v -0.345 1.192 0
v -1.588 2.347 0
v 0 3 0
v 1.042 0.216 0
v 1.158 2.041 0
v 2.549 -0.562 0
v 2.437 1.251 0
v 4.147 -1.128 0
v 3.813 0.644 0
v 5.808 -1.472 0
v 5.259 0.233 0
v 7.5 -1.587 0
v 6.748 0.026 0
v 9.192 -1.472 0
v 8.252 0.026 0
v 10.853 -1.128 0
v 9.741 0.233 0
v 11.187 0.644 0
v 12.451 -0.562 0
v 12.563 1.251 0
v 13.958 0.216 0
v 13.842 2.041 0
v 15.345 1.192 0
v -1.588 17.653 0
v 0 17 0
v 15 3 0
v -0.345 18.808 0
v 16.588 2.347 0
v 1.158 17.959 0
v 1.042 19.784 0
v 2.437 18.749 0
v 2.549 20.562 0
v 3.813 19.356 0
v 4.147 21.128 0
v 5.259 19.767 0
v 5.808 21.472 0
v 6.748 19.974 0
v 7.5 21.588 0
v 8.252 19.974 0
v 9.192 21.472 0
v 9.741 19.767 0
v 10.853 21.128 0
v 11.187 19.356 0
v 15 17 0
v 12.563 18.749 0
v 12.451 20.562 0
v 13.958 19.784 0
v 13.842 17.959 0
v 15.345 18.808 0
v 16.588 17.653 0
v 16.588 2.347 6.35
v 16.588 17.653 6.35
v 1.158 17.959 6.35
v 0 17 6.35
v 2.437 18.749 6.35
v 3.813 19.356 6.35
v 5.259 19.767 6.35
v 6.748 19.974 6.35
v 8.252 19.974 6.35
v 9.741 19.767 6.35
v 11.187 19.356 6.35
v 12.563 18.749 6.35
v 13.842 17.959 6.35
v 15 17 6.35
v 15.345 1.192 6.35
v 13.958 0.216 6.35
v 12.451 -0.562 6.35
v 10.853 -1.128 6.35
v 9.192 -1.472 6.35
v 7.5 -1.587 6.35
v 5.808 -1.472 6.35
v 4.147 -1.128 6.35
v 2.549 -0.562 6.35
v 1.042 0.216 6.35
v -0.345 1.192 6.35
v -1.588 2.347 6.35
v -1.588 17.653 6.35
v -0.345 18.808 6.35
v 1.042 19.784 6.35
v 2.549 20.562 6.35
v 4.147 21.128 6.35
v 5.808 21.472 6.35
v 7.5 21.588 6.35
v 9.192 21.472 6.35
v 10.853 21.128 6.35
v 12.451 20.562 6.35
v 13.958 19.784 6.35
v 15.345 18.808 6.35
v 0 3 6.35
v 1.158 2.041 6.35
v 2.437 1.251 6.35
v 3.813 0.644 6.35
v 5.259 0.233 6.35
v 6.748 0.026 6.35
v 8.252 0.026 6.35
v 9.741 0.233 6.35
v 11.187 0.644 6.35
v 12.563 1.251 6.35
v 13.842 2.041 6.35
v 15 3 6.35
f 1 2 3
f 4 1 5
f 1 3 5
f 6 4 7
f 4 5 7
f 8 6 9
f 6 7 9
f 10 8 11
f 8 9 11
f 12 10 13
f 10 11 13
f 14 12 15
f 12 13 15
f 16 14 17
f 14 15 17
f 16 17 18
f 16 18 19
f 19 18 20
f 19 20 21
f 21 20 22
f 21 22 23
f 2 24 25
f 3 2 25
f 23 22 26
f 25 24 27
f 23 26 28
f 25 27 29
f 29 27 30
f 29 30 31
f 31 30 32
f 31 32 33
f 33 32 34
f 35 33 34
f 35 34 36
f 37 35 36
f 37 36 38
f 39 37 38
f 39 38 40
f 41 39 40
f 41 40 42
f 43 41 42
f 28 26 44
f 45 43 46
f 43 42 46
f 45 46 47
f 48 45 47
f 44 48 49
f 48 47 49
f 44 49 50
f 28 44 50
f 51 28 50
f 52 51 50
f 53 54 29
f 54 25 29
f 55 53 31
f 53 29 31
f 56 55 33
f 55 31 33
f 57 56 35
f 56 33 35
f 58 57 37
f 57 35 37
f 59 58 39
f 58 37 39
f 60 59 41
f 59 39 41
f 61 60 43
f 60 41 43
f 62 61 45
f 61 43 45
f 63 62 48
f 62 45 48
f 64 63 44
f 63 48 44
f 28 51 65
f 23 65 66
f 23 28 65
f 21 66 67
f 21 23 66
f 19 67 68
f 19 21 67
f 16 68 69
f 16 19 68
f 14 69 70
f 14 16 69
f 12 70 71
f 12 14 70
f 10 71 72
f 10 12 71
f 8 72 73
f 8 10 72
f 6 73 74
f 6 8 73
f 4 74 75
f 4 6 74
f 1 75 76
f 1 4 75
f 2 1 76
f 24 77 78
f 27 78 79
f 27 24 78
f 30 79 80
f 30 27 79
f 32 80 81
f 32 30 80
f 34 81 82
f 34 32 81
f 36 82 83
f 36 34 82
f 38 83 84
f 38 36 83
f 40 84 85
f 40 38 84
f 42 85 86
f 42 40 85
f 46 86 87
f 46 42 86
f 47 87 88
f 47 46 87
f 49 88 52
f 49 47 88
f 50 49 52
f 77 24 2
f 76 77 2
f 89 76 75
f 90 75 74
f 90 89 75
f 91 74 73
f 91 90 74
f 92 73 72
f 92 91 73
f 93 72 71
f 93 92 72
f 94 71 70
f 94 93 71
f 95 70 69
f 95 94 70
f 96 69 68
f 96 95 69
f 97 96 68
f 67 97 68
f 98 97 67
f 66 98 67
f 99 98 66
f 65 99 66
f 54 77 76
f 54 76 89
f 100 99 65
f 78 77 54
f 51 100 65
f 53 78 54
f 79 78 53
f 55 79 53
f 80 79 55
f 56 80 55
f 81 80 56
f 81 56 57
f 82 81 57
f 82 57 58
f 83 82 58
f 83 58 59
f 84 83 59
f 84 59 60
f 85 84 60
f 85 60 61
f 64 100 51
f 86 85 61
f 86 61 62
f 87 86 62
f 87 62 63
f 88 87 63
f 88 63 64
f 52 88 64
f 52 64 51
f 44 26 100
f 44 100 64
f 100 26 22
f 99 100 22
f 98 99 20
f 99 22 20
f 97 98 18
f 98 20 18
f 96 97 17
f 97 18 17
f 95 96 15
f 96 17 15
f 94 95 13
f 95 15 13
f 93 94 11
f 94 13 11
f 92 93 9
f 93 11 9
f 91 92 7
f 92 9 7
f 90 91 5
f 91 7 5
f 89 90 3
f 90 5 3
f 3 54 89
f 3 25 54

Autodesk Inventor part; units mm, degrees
ref_plane "YZ Plane" through (0, 0, 0) normal (1, 0, 0) x (0, 1, 0)
ref_plane "XZ Plane" through (0, 0, 0) normal (0, 1, 0) x (-1, 0, 0)
ref_plane "XY Plane" through (0, 0, 0) normal (0, 0, 1) x (1, 0, 0)
sketch "Sketch1" plane through (0, 0, 0) normal (0, 0, 1) x (1, 0, 0)
  line L0 (0, 0) -> (15, 0)
  line L1 (15, 0) -> (15, 20)
  line L2 (15, 20) -> (0, 20)
  line L3 (0, 20) -> (0, 0)
  line L4 (0, 3) -> (15, 3)
  line L5 (15, 3) -> (15, 17)
  line L6 (15, 17) -> (0, 17)
  line L7 (0, 17) -> (0, 3)
  line L8 (0, 3) -> (15, 17) construction
  line L9 (15, 3) -> (0, 17) construction
  arc A0 (15, 17) -> (0, 17) centre (7.5, 9.125) ccw
  arc A1 (0, 3) -> (15, 3) centre (7.5, 10.875) ccw
  line L10 (-1.5875, -1.5875) -> (16.5875, -1.5875)
  line L11 (16.5875, -1.5875) -> (16.5875, 21.5875)
  line L12 (16.5875, 21.5875) -> (-1.5875, 21.5875)
  line L13 (-1.5875, 21.5875) -> (-1.5875, -1.5875)
  arc A2 (18.2337, 15.4576) -> (-3.6211, 14.7494) centre (7.5, 9.125) ccw
  line L14 (7.5, 10) -> (5.1883, 10)
  arc A3 (-3.6211, 5.2506) -> (18.2337, 4.5424) centre (7.5, 10.875) ccw
  point P0 (16.5875, 2.3467)
  point P1 (16.5875, 17.6533)
  point P2 (-1.5875, 17.6533)
  point P3 (-1.5875, 2.3467)
  dimension "d2" = 15
  dimension "d3" = 20
  dimension "d4" = 14
  dimension "d5" = 7.5
  dimension "d6" = 10
  dimension "d7" = 1.5875
  dimension "d8" = 1.5875
extrude "Extrusion1" add sketch "Sketch1" along normal blind 6.35 contours A3 L3 A1 L0 | L0 A3 | A3 L13 A2 L3 | A1 L1 A3 L0 | L1 A2 L11 A3 | L3 A2 L2 A0 | A0 L2 A2 L1 | L2 A2
properties part number "motor_holder_test_fit"
